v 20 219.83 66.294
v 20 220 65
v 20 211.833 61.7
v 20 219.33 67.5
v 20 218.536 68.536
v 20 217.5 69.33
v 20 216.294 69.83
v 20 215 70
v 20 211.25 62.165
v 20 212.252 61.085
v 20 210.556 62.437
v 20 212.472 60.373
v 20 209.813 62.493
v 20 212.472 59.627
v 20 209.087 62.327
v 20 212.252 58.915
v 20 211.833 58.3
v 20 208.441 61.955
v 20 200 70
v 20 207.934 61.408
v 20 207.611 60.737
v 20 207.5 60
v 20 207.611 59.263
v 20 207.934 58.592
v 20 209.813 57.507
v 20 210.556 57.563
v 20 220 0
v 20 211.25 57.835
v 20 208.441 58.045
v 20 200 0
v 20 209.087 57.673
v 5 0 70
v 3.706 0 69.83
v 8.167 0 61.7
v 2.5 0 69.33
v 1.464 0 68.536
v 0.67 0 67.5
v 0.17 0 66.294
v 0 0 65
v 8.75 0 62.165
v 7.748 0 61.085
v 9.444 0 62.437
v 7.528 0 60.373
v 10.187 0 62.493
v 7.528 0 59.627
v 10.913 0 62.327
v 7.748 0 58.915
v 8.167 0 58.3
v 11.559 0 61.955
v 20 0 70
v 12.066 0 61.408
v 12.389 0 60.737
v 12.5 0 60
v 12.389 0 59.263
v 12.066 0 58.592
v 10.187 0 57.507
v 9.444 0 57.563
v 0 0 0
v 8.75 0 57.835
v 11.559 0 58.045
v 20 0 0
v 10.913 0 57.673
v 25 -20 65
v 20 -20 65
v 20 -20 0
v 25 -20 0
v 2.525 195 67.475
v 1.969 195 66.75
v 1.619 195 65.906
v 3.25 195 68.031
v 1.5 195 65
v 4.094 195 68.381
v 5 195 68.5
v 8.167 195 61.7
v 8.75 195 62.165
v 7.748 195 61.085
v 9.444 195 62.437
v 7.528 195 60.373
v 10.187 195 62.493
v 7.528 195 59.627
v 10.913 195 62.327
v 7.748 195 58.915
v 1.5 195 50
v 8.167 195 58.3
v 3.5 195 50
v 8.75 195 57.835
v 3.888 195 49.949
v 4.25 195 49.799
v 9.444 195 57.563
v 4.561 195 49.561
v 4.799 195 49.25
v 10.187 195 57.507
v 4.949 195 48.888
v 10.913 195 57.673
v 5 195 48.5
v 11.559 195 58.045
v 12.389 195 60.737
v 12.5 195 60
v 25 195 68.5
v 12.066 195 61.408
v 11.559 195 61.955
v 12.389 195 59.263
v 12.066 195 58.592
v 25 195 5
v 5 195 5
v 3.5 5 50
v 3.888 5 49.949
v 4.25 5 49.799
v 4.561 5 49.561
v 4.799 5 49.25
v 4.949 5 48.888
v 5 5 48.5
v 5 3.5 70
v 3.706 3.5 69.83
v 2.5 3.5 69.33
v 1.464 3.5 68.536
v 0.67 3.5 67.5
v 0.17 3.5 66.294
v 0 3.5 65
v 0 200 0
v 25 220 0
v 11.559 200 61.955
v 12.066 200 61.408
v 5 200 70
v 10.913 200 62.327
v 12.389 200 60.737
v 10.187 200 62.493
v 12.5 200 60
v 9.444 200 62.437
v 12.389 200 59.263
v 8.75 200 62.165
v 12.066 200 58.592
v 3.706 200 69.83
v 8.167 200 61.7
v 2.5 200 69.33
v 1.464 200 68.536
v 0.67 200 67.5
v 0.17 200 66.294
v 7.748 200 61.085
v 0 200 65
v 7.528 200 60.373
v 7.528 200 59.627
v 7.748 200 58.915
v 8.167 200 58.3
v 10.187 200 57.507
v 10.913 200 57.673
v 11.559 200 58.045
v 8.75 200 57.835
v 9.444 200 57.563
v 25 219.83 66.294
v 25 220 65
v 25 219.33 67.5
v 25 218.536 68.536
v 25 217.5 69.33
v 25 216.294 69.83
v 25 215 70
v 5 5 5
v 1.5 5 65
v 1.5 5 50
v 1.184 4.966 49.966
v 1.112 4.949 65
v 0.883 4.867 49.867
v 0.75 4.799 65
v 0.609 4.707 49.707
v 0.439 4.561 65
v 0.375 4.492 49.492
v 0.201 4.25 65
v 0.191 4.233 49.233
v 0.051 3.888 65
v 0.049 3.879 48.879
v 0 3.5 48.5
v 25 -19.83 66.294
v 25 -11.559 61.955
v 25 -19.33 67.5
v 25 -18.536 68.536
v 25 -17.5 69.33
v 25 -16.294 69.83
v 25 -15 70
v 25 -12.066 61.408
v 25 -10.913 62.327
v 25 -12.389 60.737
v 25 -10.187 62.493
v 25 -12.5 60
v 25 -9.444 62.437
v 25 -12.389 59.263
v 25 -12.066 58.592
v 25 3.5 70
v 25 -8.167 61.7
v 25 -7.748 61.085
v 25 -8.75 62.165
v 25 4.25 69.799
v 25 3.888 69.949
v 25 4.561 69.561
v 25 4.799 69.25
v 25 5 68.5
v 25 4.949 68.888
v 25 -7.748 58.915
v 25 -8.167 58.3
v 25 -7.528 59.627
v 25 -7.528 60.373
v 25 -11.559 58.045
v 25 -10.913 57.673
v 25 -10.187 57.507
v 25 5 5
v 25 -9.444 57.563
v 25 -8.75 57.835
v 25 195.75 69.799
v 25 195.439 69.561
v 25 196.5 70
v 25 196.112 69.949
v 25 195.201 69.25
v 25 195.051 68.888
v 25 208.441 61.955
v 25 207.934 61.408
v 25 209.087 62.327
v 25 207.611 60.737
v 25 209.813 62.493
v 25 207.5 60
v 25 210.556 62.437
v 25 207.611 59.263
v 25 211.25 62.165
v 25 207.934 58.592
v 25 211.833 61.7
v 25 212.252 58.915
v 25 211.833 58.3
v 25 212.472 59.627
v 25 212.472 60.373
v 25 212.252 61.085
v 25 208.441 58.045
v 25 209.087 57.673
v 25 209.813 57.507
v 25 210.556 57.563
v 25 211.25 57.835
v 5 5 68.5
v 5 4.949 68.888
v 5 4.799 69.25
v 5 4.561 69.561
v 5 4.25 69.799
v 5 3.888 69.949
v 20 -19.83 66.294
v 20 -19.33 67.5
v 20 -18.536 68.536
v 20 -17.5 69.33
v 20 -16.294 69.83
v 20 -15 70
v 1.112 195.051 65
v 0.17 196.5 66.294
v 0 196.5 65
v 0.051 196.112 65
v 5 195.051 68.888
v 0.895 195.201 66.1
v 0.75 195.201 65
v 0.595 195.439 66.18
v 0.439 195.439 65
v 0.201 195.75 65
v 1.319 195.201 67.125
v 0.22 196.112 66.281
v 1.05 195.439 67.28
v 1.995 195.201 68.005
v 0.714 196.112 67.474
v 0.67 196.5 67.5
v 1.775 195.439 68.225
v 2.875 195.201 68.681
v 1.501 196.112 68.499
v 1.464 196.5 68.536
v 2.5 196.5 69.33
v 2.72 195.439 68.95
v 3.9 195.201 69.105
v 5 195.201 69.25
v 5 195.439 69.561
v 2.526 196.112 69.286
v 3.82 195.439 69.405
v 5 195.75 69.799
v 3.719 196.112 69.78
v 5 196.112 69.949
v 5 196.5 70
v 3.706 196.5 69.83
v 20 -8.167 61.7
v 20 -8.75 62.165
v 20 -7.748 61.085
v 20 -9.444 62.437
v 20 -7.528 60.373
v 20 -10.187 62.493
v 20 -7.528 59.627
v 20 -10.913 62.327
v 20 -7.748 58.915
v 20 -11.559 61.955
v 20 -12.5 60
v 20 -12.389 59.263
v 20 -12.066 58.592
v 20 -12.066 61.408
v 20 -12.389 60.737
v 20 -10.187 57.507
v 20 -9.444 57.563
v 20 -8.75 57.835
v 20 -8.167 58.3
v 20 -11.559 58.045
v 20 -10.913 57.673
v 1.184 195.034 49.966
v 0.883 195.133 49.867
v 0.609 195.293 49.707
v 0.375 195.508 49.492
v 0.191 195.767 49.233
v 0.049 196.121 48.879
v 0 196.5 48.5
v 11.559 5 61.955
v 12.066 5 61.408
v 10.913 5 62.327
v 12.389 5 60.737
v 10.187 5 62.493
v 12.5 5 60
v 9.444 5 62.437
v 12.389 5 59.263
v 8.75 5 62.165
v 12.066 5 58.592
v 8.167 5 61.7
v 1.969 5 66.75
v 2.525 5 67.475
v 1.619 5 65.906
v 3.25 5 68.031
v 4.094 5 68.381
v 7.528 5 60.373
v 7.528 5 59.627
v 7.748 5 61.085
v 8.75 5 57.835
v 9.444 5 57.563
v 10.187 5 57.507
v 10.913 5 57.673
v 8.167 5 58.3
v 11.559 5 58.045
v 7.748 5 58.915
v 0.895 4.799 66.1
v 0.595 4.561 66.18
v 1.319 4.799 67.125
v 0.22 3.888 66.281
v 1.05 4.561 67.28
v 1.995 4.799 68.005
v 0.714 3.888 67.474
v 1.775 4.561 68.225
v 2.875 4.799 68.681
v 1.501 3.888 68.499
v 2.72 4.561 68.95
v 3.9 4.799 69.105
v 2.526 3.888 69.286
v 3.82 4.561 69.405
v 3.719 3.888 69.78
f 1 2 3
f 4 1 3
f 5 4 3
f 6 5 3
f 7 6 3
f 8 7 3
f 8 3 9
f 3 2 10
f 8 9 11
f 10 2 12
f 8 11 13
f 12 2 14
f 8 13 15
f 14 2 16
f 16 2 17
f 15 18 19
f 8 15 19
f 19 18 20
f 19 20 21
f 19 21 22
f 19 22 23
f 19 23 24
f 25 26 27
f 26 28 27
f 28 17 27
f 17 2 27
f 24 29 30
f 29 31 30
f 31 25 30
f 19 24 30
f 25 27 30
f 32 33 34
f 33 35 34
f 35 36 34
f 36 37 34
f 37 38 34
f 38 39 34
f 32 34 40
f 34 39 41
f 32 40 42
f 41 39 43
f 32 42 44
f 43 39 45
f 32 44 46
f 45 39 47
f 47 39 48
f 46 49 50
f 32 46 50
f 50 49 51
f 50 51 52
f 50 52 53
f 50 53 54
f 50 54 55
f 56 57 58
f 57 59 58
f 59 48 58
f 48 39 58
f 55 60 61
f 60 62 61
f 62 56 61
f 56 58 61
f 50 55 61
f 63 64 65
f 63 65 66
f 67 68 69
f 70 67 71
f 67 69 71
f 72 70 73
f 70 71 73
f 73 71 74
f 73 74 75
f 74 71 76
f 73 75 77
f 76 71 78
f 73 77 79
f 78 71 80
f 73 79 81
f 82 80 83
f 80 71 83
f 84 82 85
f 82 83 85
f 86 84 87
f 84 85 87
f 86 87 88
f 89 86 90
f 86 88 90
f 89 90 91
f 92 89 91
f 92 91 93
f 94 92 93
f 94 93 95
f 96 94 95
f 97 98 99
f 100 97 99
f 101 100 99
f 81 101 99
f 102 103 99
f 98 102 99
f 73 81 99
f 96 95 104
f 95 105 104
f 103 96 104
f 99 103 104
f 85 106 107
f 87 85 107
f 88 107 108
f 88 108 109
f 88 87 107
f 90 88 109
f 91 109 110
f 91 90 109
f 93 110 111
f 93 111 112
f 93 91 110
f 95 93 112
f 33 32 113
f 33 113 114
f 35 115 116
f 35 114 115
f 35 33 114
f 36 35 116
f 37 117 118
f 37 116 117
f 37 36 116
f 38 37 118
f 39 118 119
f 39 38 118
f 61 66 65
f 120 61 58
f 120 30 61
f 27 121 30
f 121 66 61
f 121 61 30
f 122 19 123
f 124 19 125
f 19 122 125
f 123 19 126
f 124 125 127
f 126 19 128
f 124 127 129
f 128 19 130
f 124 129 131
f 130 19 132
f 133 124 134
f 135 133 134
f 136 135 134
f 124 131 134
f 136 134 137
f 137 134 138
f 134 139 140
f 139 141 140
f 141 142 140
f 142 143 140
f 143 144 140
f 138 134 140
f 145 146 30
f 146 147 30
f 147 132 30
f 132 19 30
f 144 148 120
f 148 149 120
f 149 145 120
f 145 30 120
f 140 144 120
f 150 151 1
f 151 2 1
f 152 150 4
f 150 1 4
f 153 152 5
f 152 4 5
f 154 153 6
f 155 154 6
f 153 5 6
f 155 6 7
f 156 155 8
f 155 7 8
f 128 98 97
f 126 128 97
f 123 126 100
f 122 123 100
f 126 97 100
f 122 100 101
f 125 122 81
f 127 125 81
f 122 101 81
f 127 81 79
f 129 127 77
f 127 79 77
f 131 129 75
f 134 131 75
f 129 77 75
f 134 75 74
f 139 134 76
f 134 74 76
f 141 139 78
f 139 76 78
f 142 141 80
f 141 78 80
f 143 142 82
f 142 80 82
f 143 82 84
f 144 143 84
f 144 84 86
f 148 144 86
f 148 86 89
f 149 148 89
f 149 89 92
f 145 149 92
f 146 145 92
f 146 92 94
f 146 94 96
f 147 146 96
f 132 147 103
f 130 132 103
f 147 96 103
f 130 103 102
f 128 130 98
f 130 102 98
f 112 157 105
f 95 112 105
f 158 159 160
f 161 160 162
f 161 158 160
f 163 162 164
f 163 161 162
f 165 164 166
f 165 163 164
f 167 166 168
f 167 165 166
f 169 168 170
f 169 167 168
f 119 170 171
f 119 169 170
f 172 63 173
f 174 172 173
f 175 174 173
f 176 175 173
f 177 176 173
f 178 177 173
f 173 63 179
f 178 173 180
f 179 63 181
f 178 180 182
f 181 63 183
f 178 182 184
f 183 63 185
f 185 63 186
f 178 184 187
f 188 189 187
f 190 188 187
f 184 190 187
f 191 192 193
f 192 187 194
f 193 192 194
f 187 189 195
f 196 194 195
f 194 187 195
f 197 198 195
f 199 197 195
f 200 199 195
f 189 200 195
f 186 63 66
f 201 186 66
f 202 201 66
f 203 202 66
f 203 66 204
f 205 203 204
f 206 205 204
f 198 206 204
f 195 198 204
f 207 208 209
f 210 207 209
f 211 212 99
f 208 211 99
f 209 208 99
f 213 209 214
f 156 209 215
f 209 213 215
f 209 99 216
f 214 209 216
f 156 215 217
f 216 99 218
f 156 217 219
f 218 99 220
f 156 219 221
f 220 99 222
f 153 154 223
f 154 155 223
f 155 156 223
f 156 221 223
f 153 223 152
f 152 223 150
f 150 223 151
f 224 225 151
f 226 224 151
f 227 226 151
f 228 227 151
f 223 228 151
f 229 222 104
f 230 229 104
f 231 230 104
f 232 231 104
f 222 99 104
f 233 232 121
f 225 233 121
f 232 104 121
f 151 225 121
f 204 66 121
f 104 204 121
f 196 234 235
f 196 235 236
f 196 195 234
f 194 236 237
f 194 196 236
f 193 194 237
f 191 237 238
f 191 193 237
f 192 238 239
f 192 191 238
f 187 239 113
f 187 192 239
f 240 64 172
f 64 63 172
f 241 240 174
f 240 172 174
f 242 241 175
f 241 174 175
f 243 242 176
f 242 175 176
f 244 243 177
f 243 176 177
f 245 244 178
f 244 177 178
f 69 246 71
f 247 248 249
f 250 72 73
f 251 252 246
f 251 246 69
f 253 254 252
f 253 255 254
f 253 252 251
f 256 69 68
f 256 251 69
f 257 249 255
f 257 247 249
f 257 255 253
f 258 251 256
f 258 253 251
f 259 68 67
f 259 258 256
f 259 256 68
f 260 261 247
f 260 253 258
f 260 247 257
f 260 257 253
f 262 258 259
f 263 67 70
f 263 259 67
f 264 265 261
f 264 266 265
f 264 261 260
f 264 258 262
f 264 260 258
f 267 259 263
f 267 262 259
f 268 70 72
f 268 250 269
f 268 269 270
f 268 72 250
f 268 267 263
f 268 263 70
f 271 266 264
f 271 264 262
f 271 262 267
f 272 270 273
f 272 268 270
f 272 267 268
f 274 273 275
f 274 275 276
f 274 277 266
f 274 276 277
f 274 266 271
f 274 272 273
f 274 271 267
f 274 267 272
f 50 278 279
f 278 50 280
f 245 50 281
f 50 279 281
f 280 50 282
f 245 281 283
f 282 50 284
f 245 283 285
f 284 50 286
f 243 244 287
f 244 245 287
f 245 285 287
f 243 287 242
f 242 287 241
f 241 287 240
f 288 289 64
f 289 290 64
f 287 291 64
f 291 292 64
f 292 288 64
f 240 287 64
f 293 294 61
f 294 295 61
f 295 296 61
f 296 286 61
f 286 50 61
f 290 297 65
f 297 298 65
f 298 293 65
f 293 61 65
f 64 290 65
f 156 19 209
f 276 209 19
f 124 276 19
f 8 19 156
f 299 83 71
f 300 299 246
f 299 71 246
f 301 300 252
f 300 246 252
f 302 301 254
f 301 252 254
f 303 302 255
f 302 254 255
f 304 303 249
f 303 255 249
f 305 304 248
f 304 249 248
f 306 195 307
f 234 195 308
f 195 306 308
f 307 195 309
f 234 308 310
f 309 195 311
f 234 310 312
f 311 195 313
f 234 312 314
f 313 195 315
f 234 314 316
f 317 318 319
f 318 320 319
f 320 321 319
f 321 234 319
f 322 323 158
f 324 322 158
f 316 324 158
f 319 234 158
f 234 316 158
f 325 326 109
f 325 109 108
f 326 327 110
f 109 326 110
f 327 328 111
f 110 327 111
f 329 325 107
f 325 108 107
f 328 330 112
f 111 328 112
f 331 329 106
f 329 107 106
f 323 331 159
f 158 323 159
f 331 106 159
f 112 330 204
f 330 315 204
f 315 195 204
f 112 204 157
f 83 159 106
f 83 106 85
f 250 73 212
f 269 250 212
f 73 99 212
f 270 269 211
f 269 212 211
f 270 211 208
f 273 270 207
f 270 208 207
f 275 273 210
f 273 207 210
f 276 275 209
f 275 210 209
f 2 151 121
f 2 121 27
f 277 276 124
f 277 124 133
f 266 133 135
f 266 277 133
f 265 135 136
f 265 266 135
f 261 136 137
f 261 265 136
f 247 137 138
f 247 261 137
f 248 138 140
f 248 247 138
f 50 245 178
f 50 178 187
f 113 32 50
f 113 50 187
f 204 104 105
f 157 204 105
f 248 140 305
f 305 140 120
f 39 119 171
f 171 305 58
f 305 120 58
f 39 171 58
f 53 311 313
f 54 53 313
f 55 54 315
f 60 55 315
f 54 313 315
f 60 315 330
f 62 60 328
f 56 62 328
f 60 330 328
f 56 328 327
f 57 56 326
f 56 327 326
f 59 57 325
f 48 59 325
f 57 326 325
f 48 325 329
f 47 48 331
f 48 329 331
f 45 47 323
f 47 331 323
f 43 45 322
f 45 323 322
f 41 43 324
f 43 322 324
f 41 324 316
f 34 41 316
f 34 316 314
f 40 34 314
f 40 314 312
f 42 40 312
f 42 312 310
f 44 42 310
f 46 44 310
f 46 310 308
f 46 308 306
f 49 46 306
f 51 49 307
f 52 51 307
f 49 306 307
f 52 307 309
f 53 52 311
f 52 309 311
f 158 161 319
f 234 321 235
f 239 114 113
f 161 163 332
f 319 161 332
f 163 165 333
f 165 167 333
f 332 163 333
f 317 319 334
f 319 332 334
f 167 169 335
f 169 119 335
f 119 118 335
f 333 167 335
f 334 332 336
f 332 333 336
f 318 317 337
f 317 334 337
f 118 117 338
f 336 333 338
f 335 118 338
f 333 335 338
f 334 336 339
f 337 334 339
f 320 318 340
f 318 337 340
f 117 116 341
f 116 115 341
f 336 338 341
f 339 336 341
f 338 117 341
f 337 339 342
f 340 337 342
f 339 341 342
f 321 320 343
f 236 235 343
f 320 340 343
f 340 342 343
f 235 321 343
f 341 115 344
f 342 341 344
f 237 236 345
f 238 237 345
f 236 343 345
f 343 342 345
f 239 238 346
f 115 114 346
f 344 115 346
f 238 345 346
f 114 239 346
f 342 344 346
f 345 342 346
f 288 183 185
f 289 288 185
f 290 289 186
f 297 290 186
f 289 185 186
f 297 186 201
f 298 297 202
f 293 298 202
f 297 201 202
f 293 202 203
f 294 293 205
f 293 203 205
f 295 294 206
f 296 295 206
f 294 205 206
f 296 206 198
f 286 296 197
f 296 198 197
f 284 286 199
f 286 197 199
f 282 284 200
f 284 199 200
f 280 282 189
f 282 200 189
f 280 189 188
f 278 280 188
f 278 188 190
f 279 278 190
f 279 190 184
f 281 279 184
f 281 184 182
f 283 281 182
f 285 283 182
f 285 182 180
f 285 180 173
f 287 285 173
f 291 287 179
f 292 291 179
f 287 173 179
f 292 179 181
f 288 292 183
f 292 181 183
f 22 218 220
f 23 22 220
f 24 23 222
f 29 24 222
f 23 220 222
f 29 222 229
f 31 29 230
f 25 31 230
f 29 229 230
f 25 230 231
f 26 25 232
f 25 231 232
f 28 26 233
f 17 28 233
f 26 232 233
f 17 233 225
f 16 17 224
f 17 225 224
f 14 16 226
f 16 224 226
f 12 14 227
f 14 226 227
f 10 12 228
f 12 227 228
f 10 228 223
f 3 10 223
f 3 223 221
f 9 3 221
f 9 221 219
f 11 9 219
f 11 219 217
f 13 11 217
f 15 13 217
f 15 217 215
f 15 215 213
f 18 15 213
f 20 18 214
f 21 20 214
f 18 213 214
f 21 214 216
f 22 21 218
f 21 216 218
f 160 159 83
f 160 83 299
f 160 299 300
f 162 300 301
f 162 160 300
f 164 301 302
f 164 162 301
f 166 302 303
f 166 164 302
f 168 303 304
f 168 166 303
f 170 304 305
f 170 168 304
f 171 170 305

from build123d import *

# Parameters (mm, degrees)
EXTRUDE001_DEPTH = 45
EXTRUDE_DEPTH    = 5
FACE005_R        = 2.5
EXTRUDE005_DEPTH = 5
SKETCH004_R      = 2.5
EXTRUDE004_DEPTH = 5
FACE003_R        = 2.5
EXTRUDE003_DEPTH = 5
EXTRUDE002_DEPTH = 20
FILLET_R         = 5
FILLET001_R      = 5
FILLET002_R      = 5
FILLET003_R      = 5
FILLET004_R      = 1.5
FILLET005_R      = 1.5
FILLET006_R      = 1.5
FILLET007_R      = 1.5


with BuildPart() as extrude001:
    # Face001 → Extrude001 (new body)
    with BuildSketch(Plane(origin=(7.142857, 100, 5), x_dir=(0, 1, 0), z_dir=(0, 0, 1))):
        Polygon((-120, -12.857143), (-120, -17.857143), (-95, -17.857143), (-95, 2.142857), (95, 2.142857), (95, -17.857143), (120, -17.857143), (120, -12.857143), (100, -12.857143), (100, 7.142857), (-100, 7.142857), (-100, -12.857143), align=None)
    extrude(amount=EXTRUDE001_DEPTH)


with BuildPart() as fusion:
    # Sketch → Extrude (new body)
    with BuildSketch(Plane.XY):
        Polygon((20, -20), (20, 0), (0, 0), (0, 200), (20, 200), (20, 220), (25, 220), (25, -20), align=None)
    extrude(amount=EXTRUDE_DEPTH)

    # Fusion: union Extrude001
    add(extrude001.part)


with BuildPart() as extrude005:
    # Face005 → Extrude005 (new body)
    with BuildSketch(Plane(origin=(10, 5, 60), x_dir=(1, 0, 0), z_dir=(0, 1, 0))):
        Circle(FACE005_R)
    extrude(amount=-EXTRUDE005_DEPTH)


with BuildPart() as extrude004:
    # Sketch004 (on Face12 of Cut) → Extrude004 (new body)
    with BuildSketch(Plane.XZ.offset(-195)):
        with Locations((10, 60)):
            Circle(SKETCH004_R)
    extrude(amount=-EXTRUDE004_DEPTH)


with BuildPart() as extrude003:
    # Face003 → Extrude003 (new body)
    with BuildSketch(Plane(origin=(25, -10, 60), x_dir=(0, -1, 0), z_dir=(1, 0, 0))):
        Circle(FACE003_R)
        with Locations((-220, 0)):
            Circle(FACE003_R)
    extrude(amount=-EXTRUDE003_DEPTH)


with BuildPart() as fillet007:
    # Face002 → Extrude002 (new body)
    with BuildSketch(Plane(origin=(16.944444, -3.055556, 50), x_dir=(0, 1, 0), z_dir=(0, 0, 1))):
        Polygon((8.055556, -8.055556), (8.055556, 16.944444), (3.055556, 16.944444), (3.055556, -3.055556), (-16.944444, -3.055556), (-16.944444, -8.055556), align=None)
        Polygon((203.055556, 16.944444), (198.055556, 16.944444), (198.055556, -8.055556), (223.055556, -8.055556), (223.055556, -3.055556), (203.055556, -3.055556), align=None)
    extrude(amount=EXTRUDE002_DEPTH)

    # Cut: cut Extrude003
    add(extrude003.part, mode=Mode.SUBTRACT)

    # Cut001: cut Extrude004
    add(extrude004.part, mode=Mode.SUBTRACT)

    # Cut002: cut Extrude005
    add(extrude005.part, mode=Mode.SUBTRACT)

    # Fusion001: union Fusion
    add(fusion.part)

    # Fillet
    fillet_edges = [fillet007.edges().sort_by_distance(p)[0] for p in [
        (22.5, 220, 70),
    ]]
    fillet(fillet_edges, radius=FILLET_R)

    # Fillet001
    fillet001_edges = [fillet007.edges().sort_by_distance(p)[0] for p in [
        (0, 197.5, 70),
    ]]
    fillet(fillet001_edges, radius=FILLET001_R)

    # Fillet002
    fillet002_edges = [fillet007.edges().sort_by_distance(p)[0] for p in [
        (22.5, -20, 70),
    ]]
    fillet(fillet002_edges, radius=FILLET002_R)

    # Fillet003
    fillet003_edges = [fillet007.edges().sort_by_distance(p)[0] for p in [
        (0, 2.5, 70),
    ]]
    fillet(fillet003_edges, radius=FILLET003_R)

    # Fillet004
    fillet004_edges = [fillet007.edges().sort_by_distance(p)[0] for p in [
        (5, 100, 50),
    ]]
    fillet(fillet004_edges, radius=FILLET004_R)

    # Fillet005
    fillet005_edges = [fillet007.edges().sort_by_distance(p)[0] for p in [
        (0, 100, 50),
    ]]
    fillet(fillet005_edges, radius=FILLET005_R)

    # Fillet006
    fillet006_edges = [fillet007.edges().sort_by_distance(p)[0] for p in [
        (0, 195, 57.5),
        (1.464466, 195, 68.535534),
        (15, 195, 70),
    ]]
    fillet(fillet006_edges, radius=FILLET006_R)

    # Fillet007
    fillet007_edges = [fillet007.edges().sort_by_distance(p)[0] for p in [
        (0, 5, 57.5),
    ]]
    fillet(fillet007_edges, radius=FILLET007_R)


solid = fillet007.part
